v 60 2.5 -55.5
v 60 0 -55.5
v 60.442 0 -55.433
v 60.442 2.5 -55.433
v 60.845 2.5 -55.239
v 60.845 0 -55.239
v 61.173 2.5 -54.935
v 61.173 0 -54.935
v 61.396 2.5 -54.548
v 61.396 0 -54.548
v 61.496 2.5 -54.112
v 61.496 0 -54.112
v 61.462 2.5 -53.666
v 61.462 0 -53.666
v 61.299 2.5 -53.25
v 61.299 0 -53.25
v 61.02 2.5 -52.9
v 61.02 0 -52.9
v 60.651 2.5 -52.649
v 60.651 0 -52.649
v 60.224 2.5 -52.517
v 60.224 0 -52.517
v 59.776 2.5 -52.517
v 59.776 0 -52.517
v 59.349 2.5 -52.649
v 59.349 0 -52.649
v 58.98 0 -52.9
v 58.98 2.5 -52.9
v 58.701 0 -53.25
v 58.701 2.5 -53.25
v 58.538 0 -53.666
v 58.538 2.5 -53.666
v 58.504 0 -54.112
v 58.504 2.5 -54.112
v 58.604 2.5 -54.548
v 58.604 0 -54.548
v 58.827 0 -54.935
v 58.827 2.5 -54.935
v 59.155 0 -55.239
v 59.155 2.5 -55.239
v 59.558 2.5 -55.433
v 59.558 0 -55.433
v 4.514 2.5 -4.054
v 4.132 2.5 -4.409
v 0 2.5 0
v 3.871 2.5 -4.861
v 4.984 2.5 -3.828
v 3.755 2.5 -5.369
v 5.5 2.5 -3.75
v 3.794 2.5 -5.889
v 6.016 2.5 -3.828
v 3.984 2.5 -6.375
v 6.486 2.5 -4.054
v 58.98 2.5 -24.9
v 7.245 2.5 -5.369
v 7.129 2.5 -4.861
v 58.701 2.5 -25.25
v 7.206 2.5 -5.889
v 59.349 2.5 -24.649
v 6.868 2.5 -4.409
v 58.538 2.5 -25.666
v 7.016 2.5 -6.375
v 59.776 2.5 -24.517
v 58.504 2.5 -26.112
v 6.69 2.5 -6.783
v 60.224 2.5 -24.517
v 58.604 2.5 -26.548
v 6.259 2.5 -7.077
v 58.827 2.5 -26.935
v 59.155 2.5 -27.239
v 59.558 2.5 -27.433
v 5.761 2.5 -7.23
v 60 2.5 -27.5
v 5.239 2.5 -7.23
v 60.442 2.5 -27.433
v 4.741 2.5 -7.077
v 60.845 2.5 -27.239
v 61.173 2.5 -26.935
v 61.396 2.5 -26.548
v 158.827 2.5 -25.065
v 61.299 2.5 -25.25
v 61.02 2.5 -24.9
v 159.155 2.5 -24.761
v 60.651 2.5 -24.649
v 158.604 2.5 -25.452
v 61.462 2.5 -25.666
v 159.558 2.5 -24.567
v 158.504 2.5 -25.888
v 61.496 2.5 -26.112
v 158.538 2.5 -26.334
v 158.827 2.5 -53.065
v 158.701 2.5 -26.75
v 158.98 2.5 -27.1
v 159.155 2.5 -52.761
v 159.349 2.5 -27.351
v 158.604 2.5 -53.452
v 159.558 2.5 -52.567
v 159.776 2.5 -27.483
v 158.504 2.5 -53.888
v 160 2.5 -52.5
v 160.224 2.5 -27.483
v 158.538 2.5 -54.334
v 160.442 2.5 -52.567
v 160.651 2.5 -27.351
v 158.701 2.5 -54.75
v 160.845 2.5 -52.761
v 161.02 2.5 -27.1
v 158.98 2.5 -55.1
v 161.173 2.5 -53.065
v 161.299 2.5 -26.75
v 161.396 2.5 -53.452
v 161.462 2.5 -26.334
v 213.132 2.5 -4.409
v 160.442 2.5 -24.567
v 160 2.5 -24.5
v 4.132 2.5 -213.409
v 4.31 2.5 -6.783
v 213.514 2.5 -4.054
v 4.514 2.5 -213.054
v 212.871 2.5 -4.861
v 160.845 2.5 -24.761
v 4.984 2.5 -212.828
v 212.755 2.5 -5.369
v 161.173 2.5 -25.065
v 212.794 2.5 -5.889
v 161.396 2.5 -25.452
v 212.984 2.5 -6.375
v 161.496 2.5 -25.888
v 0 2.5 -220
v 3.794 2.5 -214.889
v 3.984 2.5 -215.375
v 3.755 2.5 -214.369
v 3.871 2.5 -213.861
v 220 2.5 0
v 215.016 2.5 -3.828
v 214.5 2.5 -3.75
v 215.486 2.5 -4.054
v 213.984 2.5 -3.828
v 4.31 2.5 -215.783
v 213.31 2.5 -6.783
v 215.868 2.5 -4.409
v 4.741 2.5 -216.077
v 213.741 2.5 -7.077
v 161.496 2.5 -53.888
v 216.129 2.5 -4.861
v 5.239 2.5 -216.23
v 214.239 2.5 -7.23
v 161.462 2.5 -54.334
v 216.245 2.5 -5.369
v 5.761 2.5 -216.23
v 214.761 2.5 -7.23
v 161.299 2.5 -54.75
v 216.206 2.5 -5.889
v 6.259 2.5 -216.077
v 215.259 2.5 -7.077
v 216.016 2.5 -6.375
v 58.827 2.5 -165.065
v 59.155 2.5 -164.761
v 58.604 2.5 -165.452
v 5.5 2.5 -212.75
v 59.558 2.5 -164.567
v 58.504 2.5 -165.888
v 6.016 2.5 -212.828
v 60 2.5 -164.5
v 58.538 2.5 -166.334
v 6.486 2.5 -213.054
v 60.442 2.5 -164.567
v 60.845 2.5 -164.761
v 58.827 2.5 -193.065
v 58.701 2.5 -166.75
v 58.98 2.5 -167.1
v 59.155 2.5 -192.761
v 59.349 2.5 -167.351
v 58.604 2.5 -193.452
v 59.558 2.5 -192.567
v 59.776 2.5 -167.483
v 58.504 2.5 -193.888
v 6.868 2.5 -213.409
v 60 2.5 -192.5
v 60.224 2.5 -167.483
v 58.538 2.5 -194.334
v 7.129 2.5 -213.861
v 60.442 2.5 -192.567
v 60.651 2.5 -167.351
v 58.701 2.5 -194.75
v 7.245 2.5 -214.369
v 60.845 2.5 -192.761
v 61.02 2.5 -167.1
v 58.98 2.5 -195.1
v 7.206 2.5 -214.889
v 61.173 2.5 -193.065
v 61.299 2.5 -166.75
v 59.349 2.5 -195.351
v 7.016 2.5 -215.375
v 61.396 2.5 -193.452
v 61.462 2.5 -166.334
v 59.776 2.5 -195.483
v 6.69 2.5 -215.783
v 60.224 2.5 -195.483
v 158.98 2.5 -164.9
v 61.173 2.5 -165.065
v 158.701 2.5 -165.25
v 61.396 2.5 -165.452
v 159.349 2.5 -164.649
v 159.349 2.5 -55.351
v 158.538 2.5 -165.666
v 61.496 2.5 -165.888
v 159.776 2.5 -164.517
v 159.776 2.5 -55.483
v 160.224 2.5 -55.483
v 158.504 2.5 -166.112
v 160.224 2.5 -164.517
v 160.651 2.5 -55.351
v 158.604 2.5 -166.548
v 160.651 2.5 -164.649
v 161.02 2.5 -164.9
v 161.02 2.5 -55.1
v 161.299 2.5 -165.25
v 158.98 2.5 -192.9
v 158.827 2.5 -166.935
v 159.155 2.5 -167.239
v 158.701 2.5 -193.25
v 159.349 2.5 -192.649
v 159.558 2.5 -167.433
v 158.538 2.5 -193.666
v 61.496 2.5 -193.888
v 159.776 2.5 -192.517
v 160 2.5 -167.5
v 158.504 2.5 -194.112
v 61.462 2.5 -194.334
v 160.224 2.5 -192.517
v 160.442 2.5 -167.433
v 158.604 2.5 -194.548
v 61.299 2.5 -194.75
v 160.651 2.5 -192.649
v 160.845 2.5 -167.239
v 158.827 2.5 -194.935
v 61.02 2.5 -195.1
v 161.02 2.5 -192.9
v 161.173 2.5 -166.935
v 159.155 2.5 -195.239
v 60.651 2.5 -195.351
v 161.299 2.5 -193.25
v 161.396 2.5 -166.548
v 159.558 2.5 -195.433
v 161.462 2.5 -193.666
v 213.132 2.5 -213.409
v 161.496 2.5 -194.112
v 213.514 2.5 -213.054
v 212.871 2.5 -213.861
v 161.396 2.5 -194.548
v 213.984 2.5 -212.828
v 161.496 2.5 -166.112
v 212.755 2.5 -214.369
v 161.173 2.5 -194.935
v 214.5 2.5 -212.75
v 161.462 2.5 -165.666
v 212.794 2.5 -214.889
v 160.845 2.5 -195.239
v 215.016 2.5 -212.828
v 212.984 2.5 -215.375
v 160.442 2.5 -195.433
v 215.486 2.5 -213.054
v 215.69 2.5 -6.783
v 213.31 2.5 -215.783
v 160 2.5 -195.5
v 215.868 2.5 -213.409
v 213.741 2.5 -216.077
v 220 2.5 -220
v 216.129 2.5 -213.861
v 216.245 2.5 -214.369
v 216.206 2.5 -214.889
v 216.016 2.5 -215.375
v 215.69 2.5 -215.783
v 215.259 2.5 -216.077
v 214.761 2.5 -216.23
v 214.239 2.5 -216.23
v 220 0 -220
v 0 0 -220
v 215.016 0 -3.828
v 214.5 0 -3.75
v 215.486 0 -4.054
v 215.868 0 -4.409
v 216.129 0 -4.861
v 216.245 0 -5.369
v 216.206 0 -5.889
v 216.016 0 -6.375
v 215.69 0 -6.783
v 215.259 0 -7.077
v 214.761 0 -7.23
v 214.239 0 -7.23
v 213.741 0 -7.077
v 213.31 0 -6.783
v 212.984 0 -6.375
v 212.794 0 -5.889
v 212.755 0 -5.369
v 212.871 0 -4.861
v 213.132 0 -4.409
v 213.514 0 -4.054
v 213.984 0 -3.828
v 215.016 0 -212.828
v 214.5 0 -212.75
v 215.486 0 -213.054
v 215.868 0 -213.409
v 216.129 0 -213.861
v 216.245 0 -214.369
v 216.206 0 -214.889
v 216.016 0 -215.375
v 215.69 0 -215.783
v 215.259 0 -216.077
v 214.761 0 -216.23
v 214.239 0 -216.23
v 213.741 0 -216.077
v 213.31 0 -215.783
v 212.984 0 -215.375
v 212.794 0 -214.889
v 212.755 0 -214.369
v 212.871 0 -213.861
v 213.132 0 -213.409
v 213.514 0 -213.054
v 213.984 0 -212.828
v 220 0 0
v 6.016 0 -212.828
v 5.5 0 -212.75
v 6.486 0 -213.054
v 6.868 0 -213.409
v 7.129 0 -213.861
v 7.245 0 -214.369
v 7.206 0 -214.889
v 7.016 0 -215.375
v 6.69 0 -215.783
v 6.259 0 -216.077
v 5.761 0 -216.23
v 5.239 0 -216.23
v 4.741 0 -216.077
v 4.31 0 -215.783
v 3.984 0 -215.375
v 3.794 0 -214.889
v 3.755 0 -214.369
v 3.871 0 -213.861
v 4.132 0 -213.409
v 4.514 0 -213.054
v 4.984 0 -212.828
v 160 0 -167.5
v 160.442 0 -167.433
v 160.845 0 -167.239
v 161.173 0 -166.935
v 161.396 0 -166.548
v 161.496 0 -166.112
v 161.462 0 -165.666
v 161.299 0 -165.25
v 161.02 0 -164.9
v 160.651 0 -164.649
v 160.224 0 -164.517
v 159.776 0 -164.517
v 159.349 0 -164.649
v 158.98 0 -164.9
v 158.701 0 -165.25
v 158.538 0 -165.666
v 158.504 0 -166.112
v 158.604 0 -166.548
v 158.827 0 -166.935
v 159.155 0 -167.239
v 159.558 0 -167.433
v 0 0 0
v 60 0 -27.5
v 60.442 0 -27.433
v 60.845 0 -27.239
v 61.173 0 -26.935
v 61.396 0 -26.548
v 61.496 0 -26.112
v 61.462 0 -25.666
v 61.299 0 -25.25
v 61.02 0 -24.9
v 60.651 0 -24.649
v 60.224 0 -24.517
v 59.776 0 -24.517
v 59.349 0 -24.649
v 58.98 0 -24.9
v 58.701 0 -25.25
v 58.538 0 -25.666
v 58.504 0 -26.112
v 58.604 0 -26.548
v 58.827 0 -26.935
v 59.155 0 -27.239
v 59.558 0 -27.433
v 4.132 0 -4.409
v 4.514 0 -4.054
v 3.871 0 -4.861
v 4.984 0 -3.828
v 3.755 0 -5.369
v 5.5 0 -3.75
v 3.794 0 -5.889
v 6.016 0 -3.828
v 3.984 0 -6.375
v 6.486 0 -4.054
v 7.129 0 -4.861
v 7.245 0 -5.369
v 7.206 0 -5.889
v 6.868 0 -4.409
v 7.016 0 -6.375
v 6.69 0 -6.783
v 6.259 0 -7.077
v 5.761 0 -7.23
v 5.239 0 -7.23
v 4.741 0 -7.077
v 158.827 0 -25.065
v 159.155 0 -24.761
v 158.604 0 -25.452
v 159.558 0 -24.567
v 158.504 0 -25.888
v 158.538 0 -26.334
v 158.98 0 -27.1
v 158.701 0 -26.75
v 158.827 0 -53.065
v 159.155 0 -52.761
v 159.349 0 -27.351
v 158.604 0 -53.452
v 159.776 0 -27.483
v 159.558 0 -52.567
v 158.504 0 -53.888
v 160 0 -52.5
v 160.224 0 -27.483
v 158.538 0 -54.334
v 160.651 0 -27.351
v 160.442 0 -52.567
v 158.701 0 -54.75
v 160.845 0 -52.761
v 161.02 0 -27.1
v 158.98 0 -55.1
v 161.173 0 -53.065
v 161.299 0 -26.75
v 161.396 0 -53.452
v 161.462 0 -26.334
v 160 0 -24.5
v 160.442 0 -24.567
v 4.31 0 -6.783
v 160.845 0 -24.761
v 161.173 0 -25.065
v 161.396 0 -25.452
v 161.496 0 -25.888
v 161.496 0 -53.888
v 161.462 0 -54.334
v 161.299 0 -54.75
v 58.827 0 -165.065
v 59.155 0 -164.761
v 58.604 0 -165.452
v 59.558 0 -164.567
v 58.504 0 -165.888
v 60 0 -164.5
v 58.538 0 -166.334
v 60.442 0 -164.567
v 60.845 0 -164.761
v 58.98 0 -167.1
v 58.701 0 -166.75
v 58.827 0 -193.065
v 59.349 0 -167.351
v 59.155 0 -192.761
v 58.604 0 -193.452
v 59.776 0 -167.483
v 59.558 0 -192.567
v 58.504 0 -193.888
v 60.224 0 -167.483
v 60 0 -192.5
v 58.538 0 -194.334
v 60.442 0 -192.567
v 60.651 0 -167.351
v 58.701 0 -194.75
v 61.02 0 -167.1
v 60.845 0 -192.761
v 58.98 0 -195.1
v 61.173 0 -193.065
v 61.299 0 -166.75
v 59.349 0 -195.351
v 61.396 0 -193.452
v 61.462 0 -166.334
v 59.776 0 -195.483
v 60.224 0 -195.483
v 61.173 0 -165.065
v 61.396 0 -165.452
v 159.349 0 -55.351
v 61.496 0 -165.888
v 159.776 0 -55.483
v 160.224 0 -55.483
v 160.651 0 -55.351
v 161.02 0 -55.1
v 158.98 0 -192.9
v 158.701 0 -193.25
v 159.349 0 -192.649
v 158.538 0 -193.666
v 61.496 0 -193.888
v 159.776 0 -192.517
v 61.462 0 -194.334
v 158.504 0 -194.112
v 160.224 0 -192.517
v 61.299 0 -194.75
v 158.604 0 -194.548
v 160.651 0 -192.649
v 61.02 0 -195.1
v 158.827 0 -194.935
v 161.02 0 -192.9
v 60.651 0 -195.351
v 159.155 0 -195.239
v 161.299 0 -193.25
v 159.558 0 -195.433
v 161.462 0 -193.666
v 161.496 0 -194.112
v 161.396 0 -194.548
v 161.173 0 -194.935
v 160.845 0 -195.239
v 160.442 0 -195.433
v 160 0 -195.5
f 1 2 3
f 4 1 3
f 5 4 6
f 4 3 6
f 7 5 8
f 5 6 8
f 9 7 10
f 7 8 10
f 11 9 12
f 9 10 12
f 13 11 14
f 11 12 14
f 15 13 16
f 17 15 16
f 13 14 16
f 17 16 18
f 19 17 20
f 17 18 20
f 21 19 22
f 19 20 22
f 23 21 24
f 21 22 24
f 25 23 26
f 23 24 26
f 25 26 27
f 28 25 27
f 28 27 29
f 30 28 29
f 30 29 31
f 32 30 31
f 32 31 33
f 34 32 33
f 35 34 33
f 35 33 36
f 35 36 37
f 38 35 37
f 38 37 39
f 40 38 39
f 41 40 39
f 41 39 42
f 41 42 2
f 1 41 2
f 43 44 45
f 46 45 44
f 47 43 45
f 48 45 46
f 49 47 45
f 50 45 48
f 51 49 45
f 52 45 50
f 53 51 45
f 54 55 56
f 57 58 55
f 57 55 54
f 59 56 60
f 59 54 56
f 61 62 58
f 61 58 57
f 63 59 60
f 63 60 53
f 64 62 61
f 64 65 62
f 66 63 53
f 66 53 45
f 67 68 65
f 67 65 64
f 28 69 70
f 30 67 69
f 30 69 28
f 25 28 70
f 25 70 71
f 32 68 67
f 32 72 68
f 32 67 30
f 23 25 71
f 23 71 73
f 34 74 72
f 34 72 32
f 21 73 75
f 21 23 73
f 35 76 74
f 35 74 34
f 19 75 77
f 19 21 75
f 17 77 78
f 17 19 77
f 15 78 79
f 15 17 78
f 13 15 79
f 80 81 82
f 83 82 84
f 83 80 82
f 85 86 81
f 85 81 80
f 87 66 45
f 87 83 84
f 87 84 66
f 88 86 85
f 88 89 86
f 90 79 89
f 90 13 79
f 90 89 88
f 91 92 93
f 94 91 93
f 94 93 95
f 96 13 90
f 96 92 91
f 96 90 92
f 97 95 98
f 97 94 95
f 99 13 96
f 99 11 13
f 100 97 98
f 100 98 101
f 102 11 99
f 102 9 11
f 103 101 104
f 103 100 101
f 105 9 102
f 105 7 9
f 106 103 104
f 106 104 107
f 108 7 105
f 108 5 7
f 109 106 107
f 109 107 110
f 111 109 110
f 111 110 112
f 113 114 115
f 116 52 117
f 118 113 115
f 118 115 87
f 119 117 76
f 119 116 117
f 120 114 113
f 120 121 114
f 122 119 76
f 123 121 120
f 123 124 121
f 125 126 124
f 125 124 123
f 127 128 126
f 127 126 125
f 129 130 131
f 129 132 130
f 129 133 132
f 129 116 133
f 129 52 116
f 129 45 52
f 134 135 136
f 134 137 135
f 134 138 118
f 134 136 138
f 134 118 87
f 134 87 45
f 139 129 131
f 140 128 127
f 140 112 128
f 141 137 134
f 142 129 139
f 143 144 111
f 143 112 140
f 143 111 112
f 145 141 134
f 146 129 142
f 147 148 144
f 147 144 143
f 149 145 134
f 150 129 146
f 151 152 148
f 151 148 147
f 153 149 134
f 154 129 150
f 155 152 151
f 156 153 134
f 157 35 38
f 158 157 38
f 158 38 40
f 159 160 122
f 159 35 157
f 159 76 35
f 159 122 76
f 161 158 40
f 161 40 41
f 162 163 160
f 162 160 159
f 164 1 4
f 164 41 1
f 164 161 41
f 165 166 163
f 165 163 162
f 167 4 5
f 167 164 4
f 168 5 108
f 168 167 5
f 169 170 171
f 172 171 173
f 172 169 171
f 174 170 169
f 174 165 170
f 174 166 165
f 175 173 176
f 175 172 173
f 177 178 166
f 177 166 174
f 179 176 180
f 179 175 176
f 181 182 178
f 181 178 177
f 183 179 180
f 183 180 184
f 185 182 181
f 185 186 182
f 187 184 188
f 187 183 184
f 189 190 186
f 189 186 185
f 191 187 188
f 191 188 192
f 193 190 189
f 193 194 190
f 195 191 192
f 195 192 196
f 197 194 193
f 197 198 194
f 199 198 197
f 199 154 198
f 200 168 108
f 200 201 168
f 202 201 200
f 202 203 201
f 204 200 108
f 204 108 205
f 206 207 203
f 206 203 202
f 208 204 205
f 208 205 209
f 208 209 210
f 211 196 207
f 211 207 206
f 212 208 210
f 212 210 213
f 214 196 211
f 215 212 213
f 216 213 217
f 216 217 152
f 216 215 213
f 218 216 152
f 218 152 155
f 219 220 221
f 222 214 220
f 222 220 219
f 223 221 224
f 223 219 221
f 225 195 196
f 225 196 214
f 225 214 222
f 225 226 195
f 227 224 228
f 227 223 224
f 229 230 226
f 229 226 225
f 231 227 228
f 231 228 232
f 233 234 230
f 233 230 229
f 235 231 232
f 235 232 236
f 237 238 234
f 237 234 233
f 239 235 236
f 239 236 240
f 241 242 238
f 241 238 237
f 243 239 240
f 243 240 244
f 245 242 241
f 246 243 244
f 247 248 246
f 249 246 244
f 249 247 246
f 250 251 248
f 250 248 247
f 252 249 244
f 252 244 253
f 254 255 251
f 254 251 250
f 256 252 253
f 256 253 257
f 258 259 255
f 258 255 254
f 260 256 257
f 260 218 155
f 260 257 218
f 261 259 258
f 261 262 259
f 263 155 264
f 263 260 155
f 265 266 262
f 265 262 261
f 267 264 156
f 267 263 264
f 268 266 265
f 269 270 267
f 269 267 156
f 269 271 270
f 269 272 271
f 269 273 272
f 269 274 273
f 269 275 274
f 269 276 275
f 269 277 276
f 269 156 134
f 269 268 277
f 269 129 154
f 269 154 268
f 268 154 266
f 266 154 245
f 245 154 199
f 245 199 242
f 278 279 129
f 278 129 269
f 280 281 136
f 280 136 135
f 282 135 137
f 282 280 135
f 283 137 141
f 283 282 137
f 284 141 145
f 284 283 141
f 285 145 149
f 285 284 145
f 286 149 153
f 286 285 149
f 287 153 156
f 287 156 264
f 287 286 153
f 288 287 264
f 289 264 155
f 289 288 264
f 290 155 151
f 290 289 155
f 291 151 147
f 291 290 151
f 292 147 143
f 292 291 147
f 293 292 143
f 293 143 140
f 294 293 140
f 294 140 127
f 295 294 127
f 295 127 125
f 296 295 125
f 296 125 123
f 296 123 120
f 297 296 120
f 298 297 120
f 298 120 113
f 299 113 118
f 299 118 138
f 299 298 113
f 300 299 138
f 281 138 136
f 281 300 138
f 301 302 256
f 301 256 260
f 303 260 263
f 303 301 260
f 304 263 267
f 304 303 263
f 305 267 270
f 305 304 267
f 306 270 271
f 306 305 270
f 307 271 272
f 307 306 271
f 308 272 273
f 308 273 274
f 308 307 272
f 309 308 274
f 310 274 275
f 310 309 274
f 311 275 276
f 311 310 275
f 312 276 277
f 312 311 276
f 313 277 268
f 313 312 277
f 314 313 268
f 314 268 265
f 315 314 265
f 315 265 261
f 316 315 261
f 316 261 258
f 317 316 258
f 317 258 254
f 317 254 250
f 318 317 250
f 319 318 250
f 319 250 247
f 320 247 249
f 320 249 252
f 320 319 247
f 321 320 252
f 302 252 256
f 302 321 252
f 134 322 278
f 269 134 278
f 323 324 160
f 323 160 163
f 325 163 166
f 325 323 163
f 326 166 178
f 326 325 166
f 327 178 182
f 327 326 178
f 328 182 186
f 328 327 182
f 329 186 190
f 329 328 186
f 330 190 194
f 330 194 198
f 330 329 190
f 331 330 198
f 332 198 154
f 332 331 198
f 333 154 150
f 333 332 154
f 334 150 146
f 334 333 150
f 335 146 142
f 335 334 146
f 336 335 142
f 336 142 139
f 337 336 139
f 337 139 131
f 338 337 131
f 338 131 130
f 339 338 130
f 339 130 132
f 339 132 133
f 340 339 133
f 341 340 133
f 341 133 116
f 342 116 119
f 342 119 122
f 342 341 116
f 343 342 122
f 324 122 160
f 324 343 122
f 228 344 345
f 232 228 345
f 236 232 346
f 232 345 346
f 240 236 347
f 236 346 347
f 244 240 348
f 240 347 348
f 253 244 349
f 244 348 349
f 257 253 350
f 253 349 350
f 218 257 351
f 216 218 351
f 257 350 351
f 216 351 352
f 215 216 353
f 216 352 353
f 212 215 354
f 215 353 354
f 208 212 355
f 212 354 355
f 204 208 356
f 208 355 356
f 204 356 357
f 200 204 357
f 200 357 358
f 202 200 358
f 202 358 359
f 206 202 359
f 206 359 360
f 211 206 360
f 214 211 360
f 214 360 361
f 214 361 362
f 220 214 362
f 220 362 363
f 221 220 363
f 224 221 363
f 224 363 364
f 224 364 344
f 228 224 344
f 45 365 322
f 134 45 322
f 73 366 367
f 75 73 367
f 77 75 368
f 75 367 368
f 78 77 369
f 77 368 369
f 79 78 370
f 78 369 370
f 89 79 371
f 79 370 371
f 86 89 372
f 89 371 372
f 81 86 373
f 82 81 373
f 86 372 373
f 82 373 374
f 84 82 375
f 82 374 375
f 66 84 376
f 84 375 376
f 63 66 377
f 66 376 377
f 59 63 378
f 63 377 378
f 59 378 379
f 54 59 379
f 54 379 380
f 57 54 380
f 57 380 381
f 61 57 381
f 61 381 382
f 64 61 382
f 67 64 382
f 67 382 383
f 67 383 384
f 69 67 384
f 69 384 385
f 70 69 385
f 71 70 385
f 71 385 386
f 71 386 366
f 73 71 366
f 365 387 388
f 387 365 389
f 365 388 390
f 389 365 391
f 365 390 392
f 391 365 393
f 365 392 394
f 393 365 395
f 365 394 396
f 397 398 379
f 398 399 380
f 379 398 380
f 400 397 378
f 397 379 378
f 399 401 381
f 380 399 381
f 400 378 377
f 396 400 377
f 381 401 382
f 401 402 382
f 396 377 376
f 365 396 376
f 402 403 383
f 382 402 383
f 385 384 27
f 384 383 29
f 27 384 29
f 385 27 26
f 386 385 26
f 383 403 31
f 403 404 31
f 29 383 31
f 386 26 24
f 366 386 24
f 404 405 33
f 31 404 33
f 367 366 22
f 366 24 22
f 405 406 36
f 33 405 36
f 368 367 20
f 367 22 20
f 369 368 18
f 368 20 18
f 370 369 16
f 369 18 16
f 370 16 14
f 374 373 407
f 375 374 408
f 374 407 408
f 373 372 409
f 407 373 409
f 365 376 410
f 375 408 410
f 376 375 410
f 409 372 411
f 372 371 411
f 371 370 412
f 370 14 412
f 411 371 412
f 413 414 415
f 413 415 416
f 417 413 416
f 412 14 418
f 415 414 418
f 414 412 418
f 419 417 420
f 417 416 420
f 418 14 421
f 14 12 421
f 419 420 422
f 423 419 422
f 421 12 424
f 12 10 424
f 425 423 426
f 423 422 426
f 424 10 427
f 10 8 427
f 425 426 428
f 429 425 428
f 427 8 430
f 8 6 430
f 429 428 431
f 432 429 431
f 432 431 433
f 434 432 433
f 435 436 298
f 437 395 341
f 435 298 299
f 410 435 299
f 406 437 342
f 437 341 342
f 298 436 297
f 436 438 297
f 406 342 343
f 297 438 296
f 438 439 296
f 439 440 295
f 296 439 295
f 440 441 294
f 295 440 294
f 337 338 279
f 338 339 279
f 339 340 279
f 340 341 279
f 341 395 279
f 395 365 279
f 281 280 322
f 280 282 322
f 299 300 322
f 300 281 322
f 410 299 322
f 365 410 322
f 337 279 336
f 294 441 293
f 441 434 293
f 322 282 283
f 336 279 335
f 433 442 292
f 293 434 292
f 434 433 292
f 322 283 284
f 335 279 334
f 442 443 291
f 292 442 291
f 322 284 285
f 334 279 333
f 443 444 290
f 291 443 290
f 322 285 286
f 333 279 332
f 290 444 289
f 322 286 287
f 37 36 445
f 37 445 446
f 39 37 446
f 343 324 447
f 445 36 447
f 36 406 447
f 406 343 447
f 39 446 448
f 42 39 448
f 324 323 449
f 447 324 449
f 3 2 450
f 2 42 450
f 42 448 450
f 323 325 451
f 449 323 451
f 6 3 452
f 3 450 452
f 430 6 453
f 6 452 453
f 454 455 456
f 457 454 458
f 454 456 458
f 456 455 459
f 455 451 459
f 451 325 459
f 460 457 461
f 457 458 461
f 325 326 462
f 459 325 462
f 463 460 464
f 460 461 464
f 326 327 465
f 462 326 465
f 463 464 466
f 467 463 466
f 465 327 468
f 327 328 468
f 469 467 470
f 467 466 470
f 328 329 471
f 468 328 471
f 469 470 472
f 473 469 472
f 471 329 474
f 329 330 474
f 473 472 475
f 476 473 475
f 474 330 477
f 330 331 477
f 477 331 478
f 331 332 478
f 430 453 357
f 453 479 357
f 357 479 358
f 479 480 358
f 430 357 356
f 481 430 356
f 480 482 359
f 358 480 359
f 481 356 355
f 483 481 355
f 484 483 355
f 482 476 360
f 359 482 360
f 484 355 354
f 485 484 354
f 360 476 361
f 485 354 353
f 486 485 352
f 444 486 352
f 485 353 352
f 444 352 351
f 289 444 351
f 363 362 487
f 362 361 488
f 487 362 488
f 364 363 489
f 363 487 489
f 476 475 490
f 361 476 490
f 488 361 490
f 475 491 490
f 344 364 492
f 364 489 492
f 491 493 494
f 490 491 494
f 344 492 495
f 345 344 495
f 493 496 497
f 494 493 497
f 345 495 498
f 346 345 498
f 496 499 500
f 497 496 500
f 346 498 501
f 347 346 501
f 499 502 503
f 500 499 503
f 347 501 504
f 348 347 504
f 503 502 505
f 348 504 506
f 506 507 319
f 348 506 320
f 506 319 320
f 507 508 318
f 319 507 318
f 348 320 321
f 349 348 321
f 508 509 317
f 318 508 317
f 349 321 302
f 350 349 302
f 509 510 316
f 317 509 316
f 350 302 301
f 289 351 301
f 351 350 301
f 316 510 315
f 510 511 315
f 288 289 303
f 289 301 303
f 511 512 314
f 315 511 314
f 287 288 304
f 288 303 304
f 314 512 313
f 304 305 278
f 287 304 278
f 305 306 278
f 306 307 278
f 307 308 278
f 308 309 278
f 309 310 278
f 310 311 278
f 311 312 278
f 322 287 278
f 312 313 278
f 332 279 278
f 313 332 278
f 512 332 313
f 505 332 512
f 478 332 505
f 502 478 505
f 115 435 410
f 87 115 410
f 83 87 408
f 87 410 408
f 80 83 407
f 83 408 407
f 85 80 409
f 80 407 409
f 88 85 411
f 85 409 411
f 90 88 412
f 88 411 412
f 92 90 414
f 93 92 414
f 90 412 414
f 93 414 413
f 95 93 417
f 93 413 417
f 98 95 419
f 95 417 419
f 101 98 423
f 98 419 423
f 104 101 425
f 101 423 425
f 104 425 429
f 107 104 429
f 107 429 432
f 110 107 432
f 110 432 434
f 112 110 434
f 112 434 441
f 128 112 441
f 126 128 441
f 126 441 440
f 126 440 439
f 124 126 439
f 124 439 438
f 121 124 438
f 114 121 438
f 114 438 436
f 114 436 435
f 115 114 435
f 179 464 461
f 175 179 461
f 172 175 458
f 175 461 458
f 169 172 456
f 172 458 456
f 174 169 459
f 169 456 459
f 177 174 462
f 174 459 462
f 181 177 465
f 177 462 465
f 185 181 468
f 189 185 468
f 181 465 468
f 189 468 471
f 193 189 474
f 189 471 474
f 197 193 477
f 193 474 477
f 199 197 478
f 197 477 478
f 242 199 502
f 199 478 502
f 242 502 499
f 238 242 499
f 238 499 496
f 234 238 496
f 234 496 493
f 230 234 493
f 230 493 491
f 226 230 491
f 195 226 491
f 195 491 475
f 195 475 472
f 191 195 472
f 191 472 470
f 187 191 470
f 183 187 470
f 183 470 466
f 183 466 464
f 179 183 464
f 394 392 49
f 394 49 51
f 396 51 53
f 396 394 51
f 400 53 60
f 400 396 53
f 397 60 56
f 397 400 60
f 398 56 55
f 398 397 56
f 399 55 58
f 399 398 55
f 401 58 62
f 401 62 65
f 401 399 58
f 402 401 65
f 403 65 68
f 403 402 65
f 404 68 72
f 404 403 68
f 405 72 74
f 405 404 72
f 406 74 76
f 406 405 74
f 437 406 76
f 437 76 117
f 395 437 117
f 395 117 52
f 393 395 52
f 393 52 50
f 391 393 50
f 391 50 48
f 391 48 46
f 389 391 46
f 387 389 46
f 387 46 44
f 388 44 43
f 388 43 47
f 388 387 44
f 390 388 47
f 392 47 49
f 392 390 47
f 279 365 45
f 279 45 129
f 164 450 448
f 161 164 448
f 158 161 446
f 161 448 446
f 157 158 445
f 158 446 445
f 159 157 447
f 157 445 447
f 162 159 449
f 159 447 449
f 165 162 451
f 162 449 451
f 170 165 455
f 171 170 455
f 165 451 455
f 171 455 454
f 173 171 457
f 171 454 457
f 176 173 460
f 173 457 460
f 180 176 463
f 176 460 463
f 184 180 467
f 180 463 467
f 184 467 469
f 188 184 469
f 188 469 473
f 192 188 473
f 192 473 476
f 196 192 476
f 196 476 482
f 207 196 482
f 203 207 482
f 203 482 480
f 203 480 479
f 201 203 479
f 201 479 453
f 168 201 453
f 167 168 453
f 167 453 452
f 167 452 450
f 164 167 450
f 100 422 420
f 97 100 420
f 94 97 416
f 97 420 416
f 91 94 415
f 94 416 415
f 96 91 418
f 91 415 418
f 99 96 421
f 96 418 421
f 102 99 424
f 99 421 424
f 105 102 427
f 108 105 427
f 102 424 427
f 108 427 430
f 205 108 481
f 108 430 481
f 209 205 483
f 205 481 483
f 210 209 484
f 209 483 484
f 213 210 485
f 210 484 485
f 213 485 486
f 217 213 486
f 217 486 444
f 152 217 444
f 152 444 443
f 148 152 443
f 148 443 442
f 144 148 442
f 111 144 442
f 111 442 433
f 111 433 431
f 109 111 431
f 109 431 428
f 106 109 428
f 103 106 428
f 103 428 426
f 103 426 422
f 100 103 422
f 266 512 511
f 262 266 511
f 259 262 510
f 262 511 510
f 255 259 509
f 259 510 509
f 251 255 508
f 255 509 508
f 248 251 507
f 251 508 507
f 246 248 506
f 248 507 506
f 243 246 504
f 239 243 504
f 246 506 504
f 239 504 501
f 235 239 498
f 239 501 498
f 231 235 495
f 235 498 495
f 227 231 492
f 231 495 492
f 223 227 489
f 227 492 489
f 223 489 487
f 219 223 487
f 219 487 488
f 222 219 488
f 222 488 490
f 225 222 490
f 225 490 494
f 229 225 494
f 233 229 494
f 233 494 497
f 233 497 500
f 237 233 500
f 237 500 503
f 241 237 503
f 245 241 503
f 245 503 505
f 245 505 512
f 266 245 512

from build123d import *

# Parameters (mm, degrees)
SKETCH_1_W          = 220
SKETCH_1_H          = 220
SKETCH_1_R          = 1.75
EXTRUDE_1_DEPTH     = 2.5
SKETCH_2_R          = 1.5
CUT_EXTRUDE_1_DEPTH = 312.13702769


with BuildPart() as part:
    # 草图1 → 凸台-拉伸1 (new body)
    with BuildSketch(Plane(origin=(0, 0, 0), x_dir=(1, 0, 0), z_dir=(0, 1, 0))):
        with Locations((110, 110)):
            Rectangle(SKETCH_1_W, SKETCH_1_H)
        with Locations(Location((5.5, 5.5, 0), (0, 0, 270))):
            Circle(SKETCH_1_R, mode=Mode.SUBTRACT)
        with Locations(Location((214.5, 5.5, 0), (0, 0, 270))):
            Circle(SKETCH_1_R, mode=Mode.SUBTRACT)
        with Locations(Location((214.5, 214.5, 0), (0, 0, 270))):
            Circle(SKETCH_1_R, mode=Mode.SUBTRACT)
        with Locations(Location((5.5, 214.5, 0), (0, 0, 270))):
            Circle(SKETCH_1_R, mode=Mode.SUBTRACT)
    extrude(amount=EXTRUDE_1_DEPTH)

    # 草图2 → 切除-拉伸1 (cut, through all)
    with BuildSketch(Plane.XZ):
        with Locations(Location((60, -26, 0), (0, 0, 270))):
            Circle(SKETCH_2_R)
        with Locations(Location((60, -54, 0), (0, 0, 270))):
            Circle(SKETCH_2_R)
        with Locations(Location((60, -166, 0), (0, 0, 90))):
            Circle(SKETCH_2_R)
        with Locations(Location((60, -194, 0), (0, 0, 90))):
            Circle(SKETCH_2_R)
        with Locations(Location((160, -194, 0), (0, 0, 270))):
            Circle(SKETCH_2_R)
        with Locations(Location((160, -166, 0), (0, 0, 270))):
            Circle(SKETCH_2_R)
        with Locations(Location((160, -54, 0), (0, 0, 90))):
            Circle(SKETCH_2_R)
        with Locations(Location((160, -26, 0), (0, 0, 90))):
            Circle(SKETCH_2_R)
    extrude(amount=-CUT_EXTRUDE_1_DEPTH, mode=Mode.SUBTRACT)


solid = part.part
